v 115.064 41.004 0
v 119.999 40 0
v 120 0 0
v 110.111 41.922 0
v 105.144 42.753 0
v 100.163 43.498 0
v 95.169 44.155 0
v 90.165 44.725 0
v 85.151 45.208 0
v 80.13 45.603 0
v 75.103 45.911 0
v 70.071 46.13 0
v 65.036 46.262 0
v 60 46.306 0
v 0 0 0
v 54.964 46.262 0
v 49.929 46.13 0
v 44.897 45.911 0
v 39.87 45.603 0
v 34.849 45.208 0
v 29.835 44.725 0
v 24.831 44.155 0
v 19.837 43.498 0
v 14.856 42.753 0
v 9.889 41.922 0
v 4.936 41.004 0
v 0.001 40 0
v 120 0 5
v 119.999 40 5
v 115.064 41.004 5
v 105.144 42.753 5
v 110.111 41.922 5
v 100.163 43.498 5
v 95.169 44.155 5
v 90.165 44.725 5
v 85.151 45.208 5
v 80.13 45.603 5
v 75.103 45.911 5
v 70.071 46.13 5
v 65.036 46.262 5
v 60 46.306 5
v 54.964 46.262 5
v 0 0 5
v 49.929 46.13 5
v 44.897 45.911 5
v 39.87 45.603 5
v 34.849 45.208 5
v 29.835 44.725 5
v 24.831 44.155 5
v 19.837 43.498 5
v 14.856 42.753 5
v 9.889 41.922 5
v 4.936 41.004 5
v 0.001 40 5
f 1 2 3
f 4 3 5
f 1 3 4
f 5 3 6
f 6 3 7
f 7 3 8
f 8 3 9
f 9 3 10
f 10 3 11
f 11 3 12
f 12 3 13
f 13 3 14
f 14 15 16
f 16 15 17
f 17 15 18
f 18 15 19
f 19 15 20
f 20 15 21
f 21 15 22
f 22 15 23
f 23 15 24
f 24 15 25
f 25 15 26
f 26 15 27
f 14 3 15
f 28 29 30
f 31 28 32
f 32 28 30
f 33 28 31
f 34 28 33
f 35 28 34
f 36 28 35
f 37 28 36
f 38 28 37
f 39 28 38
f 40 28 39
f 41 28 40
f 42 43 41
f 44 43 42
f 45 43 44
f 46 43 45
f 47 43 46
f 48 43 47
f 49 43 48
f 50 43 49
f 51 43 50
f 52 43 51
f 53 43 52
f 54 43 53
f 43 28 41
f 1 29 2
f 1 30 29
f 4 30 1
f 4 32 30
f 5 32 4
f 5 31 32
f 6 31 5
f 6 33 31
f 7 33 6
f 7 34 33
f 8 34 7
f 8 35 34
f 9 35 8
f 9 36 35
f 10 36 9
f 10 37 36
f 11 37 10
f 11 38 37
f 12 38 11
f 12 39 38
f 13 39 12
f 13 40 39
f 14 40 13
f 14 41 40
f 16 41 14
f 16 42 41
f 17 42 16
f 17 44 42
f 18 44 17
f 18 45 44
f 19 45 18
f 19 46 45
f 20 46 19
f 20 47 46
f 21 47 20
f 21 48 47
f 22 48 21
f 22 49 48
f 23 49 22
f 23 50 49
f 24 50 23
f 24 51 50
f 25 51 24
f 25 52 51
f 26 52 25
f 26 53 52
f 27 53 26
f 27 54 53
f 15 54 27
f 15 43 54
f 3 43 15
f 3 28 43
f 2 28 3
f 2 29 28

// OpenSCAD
$fn = 32;

// ----------------------------------------------------------------------
// Arc profile plate: crown, 27 points
// ----------------------------------------------------------------------

// --- parameters (mm) ---
bar_l = 120;              // bar length, X
bar_w = 40;               // bar height at the ends, Y
arc_r = 288.58;           // radius of the crown arc
arc_angle = 24;           // crown arc angle, degrees
crown_rise = 6.31;        // rise of the crown over the ends
arc_step = 1;             // sampling step of the crown arc, degrees
plate_t = 5;              // plate thickness, Z
fit_tol = 0.1;            // declared fit tolerance (prompt contract)
free_tol = 0.3;           // declared free tolerance (prompt contract)

bbox_y = bar_w + crown_rise;  // full height with the crown

profile = [[119.999, 40], [115.064, 41.004], [110.111, 41.922], [105.144, 42.753], [100.163, 43.498], [95.169, 44.155], [90.165, 44.725], [85.151, 45.208], [80.13, 45.603], [75.103, 45.911], [70.071, 46.13], [65.036, 46.262], [60, 46.306], [54.964, 46.262], [49.929, 46.13], [44.897, 45.911], [39.87, 45.603], [34.849, 45.208], [29.835, 44.725], [24.831, 44.155], [19.837, 43.498], [14.856, 42.753], [9.889, 41.922], [4.936, 41.004], [0.001, 40], [0, 0], [120, 0]];  // primary outline, 27 points, counter clockwise

// --- the one profile operation ---
linear_extrude(height = plate_t) polygon(points = profile);
